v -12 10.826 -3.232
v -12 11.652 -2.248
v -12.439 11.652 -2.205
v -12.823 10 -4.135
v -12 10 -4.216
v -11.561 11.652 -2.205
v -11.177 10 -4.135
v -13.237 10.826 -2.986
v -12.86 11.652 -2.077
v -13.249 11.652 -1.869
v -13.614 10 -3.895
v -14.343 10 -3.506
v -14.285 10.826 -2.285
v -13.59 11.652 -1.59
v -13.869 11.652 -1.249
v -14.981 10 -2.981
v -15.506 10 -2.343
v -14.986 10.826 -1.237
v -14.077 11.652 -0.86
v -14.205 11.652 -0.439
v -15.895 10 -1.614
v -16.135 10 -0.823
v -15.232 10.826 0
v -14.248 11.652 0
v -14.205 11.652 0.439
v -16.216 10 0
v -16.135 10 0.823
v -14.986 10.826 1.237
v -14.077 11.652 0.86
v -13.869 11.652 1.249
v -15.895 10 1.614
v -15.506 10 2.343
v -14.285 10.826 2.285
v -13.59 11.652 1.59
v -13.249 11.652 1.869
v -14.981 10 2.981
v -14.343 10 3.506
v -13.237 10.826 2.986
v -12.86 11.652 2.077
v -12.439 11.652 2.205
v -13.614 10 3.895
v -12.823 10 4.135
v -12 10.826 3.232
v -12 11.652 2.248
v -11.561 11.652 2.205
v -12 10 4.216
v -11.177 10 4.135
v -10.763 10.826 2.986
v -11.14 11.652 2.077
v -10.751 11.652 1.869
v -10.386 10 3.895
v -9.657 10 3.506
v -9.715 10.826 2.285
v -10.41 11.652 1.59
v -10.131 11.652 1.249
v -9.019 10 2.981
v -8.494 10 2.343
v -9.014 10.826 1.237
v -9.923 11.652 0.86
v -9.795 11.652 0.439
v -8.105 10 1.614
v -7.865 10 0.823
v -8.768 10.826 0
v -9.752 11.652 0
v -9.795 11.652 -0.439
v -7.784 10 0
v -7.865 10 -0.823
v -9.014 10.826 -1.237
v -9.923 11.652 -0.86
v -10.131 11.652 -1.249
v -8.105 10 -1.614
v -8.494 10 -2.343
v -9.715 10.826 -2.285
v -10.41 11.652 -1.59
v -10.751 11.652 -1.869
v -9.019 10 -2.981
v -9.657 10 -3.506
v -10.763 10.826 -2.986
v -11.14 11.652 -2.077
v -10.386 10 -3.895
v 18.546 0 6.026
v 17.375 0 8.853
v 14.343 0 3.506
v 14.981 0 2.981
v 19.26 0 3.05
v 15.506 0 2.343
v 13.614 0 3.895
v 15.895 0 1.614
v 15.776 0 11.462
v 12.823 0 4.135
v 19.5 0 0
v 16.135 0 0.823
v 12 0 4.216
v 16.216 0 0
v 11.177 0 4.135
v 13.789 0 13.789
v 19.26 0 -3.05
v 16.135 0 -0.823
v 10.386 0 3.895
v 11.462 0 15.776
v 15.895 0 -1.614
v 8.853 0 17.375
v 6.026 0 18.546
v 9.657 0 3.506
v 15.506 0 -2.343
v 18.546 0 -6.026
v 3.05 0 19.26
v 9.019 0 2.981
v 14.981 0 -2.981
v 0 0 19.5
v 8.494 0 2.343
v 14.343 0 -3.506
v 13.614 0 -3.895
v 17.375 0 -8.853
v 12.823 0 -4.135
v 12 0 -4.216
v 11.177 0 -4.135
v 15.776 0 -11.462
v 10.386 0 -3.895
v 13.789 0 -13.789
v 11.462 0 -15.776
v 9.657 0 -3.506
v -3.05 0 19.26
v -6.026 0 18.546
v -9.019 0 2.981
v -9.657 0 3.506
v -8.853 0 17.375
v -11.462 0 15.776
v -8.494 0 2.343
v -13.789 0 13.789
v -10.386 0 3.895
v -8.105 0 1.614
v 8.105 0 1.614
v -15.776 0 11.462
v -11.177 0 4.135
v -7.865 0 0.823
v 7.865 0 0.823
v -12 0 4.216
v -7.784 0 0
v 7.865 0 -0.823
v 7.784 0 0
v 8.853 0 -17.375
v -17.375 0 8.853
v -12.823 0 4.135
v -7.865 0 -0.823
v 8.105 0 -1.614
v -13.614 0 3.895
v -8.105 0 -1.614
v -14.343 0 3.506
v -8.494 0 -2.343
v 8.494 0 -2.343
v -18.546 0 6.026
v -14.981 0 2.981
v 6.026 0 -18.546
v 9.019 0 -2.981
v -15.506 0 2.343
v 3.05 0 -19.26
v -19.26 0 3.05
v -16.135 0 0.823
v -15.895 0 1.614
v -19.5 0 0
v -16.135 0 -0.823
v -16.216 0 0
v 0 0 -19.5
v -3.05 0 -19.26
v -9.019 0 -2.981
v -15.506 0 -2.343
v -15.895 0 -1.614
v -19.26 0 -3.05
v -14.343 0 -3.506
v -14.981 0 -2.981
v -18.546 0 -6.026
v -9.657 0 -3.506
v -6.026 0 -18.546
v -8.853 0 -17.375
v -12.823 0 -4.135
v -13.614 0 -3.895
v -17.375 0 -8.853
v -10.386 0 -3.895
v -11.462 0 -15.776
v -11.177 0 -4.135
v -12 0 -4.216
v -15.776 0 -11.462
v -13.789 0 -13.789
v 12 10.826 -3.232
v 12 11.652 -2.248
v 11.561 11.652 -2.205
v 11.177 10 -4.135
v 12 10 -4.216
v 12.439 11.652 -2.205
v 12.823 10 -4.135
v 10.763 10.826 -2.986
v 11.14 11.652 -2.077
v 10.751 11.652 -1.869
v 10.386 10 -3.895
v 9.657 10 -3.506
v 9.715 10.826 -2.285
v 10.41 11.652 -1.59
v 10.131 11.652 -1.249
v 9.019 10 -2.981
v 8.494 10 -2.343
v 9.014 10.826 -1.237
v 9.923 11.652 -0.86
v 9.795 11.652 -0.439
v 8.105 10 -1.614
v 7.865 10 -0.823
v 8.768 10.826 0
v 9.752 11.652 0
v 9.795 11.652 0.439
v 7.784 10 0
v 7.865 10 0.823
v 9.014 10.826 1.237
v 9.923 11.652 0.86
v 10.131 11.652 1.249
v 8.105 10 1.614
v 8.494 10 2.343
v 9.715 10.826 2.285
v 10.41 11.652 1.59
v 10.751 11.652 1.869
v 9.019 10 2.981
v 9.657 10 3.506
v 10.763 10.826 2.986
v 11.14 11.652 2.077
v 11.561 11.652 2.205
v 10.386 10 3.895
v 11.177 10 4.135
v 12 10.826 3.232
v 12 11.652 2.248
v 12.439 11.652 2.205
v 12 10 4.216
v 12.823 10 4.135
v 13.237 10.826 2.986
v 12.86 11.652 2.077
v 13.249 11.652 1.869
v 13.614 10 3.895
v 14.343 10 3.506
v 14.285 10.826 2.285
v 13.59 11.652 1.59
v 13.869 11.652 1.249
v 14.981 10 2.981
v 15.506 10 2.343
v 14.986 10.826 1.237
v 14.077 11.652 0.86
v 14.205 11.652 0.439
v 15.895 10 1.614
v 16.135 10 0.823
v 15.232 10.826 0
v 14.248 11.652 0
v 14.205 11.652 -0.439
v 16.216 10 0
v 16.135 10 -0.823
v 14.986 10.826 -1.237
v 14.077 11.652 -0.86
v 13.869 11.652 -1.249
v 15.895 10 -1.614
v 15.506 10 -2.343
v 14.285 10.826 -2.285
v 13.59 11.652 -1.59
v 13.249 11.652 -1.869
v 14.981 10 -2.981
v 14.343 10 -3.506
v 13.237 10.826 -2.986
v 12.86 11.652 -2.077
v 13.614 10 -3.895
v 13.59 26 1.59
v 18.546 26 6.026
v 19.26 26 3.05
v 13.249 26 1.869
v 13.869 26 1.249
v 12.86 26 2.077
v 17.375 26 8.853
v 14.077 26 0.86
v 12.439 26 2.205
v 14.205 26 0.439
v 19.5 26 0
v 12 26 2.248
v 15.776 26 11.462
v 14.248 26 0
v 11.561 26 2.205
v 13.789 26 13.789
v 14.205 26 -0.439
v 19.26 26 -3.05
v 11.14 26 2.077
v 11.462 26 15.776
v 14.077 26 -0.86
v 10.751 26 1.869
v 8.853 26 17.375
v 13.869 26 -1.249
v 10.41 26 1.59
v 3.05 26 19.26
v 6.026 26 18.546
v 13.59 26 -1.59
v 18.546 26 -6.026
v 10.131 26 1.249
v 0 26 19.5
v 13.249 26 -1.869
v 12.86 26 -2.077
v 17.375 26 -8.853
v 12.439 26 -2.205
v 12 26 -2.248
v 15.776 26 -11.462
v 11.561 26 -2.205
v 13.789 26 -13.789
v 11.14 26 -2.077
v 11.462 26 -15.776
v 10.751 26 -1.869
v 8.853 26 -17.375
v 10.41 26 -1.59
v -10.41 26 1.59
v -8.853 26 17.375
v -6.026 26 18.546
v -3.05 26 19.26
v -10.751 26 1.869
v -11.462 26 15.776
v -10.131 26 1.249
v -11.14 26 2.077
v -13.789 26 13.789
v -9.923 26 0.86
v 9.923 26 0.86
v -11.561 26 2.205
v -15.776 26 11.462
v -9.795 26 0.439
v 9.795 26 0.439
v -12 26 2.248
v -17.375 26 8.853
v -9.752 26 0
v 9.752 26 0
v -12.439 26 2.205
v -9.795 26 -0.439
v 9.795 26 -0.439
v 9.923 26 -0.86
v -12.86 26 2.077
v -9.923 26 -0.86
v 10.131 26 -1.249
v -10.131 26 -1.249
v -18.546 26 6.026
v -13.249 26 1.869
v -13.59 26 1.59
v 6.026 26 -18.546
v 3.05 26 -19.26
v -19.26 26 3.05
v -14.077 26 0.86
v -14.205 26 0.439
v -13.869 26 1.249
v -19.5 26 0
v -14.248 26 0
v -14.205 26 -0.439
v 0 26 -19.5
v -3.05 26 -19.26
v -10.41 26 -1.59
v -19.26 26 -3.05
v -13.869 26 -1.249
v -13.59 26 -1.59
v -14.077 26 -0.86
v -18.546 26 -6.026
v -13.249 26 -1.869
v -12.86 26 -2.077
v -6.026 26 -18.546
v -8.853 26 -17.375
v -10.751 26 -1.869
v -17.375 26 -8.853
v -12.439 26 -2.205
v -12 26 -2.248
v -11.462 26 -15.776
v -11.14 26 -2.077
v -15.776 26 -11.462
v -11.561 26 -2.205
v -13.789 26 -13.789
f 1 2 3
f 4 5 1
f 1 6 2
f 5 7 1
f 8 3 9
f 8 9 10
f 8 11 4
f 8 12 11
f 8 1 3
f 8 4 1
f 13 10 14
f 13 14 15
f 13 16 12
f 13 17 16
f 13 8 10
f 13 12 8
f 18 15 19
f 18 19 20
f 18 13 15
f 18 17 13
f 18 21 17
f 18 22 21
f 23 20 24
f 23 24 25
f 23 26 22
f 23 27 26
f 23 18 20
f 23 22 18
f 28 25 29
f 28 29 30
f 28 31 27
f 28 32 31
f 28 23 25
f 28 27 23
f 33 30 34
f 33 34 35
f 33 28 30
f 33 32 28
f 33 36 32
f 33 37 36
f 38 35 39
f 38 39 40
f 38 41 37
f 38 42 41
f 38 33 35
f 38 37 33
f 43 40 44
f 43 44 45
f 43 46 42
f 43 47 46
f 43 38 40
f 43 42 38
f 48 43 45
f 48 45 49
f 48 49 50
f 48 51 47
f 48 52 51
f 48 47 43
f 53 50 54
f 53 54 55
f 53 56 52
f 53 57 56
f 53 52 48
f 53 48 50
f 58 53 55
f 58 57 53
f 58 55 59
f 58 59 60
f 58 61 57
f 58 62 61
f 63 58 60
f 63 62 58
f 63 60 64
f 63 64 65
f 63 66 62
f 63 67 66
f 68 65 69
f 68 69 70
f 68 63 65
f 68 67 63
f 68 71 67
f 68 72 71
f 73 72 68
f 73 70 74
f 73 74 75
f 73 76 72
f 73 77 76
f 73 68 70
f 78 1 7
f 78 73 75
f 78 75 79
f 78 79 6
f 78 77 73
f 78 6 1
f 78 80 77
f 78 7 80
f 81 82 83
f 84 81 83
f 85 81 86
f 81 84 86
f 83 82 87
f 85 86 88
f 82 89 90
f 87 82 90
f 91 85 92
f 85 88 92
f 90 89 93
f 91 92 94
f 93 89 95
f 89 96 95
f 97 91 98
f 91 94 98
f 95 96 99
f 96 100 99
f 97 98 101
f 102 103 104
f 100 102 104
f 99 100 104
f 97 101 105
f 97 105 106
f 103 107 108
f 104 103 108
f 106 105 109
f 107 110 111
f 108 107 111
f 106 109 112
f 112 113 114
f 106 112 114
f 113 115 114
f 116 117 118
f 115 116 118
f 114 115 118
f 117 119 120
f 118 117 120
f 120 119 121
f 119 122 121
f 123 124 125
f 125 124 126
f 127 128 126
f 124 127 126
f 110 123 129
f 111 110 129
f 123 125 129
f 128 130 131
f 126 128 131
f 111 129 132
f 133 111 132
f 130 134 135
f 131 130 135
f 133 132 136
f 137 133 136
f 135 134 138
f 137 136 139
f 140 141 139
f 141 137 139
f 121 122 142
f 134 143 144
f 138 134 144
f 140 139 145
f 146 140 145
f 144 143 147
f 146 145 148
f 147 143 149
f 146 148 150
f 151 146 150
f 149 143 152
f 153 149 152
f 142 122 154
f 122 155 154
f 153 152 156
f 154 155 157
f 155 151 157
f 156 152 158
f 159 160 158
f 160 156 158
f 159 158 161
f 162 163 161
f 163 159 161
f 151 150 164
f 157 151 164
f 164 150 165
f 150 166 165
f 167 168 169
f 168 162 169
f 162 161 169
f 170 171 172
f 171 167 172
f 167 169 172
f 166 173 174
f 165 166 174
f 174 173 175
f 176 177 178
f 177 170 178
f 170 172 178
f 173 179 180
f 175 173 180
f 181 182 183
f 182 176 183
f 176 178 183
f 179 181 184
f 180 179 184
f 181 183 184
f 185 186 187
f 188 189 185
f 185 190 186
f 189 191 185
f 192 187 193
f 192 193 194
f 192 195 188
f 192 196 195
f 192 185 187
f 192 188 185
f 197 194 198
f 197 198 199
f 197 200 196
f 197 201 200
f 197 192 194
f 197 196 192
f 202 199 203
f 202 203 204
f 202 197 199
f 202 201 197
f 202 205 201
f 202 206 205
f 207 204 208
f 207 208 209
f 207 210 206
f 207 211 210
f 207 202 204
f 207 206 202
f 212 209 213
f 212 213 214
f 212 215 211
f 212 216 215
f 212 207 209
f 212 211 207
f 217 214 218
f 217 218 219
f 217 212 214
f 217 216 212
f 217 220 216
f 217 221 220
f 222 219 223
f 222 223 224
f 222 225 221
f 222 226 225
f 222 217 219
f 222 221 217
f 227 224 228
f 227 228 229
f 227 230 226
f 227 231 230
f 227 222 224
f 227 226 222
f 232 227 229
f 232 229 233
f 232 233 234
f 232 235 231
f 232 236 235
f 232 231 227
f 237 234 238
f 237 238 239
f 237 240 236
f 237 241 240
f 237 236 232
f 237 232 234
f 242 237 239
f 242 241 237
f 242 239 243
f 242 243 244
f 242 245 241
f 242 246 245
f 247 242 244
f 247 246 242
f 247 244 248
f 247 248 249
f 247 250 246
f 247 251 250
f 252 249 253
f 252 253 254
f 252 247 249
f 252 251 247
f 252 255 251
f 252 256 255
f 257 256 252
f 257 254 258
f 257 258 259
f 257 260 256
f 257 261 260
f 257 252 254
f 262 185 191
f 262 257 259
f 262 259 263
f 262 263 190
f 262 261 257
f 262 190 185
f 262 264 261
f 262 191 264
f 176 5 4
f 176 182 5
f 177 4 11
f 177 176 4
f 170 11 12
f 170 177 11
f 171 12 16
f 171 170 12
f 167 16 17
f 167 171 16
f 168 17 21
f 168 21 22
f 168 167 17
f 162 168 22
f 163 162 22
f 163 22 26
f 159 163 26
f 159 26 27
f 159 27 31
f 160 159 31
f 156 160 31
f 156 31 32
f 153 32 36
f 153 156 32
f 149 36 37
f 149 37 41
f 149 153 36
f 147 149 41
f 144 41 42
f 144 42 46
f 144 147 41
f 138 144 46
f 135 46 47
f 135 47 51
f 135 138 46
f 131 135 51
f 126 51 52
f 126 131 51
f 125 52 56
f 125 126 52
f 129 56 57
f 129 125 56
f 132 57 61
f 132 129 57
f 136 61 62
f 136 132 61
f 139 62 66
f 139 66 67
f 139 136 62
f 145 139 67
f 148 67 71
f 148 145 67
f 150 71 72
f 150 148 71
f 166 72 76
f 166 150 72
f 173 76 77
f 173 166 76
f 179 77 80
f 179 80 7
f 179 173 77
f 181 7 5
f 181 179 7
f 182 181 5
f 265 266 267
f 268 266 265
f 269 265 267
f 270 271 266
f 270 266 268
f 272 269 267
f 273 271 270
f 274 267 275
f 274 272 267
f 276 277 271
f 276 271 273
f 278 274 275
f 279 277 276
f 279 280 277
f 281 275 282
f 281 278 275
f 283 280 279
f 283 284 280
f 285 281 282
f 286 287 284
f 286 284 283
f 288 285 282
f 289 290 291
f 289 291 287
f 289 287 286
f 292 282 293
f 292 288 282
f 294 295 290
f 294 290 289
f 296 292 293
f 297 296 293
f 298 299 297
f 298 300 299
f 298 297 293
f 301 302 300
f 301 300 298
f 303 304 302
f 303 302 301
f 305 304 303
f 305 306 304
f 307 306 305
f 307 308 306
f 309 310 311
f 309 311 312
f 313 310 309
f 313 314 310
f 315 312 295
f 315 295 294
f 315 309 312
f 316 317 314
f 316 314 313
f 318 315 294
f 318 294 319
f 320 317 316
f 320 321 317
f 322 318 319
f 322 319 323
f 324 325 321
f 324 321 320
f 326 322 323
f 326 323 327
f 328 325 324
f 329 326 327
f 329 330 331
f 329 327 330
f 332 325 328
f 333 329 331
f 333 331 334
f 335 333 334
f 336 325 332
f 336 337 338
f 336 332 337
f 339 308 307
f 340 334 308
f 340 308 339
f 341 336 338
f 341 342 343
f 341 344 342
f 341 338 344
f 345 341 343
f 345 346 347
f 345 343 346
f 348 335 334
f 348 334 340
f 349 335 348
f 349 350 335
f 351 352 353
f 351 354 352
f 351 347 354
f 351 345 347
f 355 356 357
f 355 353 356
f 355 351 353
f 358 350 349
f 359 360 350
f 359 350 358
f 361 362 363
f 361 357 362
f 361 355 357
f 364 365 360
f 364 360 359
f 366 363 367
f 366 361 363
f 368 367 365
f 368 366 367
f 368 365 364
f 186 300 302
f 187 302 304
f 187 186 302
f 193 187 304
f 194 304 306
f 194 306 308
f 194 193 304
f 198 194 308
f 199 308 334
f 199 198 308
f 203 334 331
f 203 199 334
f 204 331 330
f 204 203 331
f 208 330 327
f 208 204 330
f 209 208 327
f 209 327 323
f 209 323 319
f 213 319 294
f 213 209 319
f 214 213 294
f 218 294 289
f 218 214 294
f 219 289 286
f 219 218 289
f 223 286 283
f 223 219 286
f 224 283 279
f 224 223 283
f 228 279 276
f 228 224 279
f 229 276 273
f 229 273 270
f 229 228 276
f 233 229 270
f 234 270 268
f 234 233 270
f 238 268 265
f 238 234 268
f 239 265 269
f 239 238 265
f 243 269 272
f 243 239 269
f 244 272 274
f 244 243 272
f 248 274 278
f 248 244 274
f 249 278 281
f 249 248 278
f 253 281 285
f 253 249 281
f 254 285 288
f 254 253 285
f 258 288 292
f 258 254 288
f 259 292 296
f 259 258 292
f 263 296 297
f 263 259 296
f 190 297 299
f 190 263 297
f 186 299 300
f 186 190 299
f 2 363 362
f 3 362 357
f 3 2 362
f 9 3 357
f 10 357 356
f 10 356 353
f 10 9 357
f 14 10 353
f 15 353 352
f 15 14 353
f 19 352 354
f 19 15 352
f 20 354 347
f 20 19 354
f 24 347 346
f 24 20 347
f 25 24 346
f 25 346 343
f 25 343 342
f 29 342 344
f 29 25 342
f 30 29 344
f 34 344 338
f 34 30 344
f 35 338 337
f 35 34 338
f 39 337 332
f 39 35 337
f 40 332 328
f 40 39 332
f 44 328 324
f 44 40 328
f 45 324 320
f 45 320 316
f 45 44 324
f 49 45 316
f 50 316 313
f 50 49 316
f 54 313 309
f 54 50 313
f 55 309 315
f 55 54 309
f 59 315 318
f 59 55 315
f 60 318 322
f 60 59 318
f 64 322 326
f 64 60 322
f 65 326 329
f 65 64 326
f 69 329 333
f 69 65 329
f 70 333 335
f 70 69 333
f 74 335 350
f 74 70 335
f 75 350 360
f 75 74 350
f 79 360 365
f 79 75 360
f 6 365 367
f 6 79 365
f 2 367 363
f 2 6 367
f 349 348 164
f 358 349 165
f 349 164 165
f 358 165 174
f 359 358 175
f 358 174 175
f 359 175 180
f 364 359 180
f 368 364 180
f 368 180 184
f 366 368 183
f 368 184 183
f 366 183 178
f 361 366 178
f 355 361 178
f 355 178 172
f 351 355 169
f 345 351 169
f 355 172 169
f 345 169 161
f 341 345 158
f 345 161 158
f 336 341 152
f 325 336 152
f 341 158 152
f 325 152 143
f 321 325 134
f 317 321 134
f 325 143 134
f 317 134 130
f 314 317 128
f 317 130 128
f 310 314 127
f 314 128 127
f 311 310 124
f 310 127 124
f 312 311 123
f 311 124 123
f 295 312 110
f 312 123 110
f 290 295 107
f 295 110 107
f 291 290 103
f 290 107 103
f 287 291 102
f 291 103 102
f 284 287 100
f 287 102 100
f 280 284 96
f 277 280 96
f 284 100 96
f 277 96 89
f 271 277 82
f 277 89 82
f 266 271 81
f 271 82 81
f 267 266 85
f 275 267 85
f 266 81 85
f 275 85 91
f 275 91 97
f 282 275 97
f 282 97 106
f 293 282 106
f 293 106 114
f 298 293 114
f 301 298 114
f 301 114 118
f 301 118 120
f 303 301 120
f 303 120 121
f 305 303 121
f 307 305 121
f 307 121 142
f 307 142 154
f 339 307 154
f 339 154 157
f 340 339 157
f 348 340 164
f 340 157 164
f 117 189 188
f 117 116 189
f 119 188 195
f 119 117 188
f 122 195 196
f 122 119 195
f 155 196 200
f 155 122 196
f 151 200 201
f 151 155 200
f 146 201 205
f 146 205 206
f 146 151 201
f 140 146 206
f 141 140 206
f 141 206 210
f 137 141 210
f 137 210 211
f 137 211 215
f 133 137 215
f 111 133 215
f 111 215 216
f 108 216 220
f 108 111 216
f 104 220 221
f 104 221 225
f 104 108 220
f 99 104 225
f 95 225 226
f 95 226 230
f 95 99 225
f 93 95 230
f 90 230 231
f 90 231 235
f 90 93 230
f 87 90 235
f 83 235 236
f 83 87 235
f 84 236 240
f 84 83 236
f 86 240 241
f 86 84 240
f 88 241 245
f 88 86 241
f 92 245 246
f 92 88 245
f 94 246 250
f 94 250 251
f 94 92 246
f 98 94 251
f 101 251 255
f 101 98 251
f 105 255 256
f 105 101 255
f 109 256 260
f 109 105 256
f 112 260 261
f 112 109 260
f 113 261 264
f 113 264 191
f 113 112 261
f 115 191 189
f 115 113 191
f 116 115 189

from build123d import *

# Parameters (mm, degrees)
SKETCH1_R                                 = 19.5
BOSS_EXTRUDE1_DEPTH                       = 26
CSK_FOR_8_FLAT_HEAD_MACHINE_SCREW_2_COUNT = 2
CSK_FOR_8_FLAT_HEAD_MACHINE_SCREW_2_PITCH = 24


with BuildPart() as part:
    # Sketch1 → Boss-Extrude1 (new body)
    with BuildSketch(Plane(origin=(0, 0, 0), x_dir=(1, 0, 0), z_dir=(0, 1, 0))):
        with Locations(Location((0, 0, 0), (0, 0, 90))):
            Circle(SKETCH1_R)
    extrude(amount=BOSS_EXTRUDE1_DEPTH)

    # Sketch3 → CSK for #8 Flat Head Machine Screw (100)1 (revolve, cut)
    with BuildSketch(Plane(origin=(12, 0, 0), x_dir=(0, 0, -1), z_dir=(1, 0, 0))):
        Polygon((0, 0), (0, 26), (2.2479, 26), (2.2479, 11.651767624), (4.2164, 10), (4.2164, 0), align=None)
    csk_for_8_flat_head_machine_screw_100 = revolve(axis=Axis((12, -6.35, 0), (0, 1, 0)), mode=Mode.SUBTRACT)

    # CSK for _8 Flat Head Machine Screw _ 2: CSK for #8 Flat Head Machine Screw (100)1 ×2
    with Locations(*[(-i * CSK_FOR_8_FLAT_HEAD_MACHINE_SCREW_2_PITCH, 0, 0) for i in range(1, CSK_FOR_8_FLAT_HEAD_MACHINE_SCREW_2_COUNT)]):
        add(csk_for_8_flat_head_machine_screw_100, mode=Mode.SUBTRACT)


solid = part.part
